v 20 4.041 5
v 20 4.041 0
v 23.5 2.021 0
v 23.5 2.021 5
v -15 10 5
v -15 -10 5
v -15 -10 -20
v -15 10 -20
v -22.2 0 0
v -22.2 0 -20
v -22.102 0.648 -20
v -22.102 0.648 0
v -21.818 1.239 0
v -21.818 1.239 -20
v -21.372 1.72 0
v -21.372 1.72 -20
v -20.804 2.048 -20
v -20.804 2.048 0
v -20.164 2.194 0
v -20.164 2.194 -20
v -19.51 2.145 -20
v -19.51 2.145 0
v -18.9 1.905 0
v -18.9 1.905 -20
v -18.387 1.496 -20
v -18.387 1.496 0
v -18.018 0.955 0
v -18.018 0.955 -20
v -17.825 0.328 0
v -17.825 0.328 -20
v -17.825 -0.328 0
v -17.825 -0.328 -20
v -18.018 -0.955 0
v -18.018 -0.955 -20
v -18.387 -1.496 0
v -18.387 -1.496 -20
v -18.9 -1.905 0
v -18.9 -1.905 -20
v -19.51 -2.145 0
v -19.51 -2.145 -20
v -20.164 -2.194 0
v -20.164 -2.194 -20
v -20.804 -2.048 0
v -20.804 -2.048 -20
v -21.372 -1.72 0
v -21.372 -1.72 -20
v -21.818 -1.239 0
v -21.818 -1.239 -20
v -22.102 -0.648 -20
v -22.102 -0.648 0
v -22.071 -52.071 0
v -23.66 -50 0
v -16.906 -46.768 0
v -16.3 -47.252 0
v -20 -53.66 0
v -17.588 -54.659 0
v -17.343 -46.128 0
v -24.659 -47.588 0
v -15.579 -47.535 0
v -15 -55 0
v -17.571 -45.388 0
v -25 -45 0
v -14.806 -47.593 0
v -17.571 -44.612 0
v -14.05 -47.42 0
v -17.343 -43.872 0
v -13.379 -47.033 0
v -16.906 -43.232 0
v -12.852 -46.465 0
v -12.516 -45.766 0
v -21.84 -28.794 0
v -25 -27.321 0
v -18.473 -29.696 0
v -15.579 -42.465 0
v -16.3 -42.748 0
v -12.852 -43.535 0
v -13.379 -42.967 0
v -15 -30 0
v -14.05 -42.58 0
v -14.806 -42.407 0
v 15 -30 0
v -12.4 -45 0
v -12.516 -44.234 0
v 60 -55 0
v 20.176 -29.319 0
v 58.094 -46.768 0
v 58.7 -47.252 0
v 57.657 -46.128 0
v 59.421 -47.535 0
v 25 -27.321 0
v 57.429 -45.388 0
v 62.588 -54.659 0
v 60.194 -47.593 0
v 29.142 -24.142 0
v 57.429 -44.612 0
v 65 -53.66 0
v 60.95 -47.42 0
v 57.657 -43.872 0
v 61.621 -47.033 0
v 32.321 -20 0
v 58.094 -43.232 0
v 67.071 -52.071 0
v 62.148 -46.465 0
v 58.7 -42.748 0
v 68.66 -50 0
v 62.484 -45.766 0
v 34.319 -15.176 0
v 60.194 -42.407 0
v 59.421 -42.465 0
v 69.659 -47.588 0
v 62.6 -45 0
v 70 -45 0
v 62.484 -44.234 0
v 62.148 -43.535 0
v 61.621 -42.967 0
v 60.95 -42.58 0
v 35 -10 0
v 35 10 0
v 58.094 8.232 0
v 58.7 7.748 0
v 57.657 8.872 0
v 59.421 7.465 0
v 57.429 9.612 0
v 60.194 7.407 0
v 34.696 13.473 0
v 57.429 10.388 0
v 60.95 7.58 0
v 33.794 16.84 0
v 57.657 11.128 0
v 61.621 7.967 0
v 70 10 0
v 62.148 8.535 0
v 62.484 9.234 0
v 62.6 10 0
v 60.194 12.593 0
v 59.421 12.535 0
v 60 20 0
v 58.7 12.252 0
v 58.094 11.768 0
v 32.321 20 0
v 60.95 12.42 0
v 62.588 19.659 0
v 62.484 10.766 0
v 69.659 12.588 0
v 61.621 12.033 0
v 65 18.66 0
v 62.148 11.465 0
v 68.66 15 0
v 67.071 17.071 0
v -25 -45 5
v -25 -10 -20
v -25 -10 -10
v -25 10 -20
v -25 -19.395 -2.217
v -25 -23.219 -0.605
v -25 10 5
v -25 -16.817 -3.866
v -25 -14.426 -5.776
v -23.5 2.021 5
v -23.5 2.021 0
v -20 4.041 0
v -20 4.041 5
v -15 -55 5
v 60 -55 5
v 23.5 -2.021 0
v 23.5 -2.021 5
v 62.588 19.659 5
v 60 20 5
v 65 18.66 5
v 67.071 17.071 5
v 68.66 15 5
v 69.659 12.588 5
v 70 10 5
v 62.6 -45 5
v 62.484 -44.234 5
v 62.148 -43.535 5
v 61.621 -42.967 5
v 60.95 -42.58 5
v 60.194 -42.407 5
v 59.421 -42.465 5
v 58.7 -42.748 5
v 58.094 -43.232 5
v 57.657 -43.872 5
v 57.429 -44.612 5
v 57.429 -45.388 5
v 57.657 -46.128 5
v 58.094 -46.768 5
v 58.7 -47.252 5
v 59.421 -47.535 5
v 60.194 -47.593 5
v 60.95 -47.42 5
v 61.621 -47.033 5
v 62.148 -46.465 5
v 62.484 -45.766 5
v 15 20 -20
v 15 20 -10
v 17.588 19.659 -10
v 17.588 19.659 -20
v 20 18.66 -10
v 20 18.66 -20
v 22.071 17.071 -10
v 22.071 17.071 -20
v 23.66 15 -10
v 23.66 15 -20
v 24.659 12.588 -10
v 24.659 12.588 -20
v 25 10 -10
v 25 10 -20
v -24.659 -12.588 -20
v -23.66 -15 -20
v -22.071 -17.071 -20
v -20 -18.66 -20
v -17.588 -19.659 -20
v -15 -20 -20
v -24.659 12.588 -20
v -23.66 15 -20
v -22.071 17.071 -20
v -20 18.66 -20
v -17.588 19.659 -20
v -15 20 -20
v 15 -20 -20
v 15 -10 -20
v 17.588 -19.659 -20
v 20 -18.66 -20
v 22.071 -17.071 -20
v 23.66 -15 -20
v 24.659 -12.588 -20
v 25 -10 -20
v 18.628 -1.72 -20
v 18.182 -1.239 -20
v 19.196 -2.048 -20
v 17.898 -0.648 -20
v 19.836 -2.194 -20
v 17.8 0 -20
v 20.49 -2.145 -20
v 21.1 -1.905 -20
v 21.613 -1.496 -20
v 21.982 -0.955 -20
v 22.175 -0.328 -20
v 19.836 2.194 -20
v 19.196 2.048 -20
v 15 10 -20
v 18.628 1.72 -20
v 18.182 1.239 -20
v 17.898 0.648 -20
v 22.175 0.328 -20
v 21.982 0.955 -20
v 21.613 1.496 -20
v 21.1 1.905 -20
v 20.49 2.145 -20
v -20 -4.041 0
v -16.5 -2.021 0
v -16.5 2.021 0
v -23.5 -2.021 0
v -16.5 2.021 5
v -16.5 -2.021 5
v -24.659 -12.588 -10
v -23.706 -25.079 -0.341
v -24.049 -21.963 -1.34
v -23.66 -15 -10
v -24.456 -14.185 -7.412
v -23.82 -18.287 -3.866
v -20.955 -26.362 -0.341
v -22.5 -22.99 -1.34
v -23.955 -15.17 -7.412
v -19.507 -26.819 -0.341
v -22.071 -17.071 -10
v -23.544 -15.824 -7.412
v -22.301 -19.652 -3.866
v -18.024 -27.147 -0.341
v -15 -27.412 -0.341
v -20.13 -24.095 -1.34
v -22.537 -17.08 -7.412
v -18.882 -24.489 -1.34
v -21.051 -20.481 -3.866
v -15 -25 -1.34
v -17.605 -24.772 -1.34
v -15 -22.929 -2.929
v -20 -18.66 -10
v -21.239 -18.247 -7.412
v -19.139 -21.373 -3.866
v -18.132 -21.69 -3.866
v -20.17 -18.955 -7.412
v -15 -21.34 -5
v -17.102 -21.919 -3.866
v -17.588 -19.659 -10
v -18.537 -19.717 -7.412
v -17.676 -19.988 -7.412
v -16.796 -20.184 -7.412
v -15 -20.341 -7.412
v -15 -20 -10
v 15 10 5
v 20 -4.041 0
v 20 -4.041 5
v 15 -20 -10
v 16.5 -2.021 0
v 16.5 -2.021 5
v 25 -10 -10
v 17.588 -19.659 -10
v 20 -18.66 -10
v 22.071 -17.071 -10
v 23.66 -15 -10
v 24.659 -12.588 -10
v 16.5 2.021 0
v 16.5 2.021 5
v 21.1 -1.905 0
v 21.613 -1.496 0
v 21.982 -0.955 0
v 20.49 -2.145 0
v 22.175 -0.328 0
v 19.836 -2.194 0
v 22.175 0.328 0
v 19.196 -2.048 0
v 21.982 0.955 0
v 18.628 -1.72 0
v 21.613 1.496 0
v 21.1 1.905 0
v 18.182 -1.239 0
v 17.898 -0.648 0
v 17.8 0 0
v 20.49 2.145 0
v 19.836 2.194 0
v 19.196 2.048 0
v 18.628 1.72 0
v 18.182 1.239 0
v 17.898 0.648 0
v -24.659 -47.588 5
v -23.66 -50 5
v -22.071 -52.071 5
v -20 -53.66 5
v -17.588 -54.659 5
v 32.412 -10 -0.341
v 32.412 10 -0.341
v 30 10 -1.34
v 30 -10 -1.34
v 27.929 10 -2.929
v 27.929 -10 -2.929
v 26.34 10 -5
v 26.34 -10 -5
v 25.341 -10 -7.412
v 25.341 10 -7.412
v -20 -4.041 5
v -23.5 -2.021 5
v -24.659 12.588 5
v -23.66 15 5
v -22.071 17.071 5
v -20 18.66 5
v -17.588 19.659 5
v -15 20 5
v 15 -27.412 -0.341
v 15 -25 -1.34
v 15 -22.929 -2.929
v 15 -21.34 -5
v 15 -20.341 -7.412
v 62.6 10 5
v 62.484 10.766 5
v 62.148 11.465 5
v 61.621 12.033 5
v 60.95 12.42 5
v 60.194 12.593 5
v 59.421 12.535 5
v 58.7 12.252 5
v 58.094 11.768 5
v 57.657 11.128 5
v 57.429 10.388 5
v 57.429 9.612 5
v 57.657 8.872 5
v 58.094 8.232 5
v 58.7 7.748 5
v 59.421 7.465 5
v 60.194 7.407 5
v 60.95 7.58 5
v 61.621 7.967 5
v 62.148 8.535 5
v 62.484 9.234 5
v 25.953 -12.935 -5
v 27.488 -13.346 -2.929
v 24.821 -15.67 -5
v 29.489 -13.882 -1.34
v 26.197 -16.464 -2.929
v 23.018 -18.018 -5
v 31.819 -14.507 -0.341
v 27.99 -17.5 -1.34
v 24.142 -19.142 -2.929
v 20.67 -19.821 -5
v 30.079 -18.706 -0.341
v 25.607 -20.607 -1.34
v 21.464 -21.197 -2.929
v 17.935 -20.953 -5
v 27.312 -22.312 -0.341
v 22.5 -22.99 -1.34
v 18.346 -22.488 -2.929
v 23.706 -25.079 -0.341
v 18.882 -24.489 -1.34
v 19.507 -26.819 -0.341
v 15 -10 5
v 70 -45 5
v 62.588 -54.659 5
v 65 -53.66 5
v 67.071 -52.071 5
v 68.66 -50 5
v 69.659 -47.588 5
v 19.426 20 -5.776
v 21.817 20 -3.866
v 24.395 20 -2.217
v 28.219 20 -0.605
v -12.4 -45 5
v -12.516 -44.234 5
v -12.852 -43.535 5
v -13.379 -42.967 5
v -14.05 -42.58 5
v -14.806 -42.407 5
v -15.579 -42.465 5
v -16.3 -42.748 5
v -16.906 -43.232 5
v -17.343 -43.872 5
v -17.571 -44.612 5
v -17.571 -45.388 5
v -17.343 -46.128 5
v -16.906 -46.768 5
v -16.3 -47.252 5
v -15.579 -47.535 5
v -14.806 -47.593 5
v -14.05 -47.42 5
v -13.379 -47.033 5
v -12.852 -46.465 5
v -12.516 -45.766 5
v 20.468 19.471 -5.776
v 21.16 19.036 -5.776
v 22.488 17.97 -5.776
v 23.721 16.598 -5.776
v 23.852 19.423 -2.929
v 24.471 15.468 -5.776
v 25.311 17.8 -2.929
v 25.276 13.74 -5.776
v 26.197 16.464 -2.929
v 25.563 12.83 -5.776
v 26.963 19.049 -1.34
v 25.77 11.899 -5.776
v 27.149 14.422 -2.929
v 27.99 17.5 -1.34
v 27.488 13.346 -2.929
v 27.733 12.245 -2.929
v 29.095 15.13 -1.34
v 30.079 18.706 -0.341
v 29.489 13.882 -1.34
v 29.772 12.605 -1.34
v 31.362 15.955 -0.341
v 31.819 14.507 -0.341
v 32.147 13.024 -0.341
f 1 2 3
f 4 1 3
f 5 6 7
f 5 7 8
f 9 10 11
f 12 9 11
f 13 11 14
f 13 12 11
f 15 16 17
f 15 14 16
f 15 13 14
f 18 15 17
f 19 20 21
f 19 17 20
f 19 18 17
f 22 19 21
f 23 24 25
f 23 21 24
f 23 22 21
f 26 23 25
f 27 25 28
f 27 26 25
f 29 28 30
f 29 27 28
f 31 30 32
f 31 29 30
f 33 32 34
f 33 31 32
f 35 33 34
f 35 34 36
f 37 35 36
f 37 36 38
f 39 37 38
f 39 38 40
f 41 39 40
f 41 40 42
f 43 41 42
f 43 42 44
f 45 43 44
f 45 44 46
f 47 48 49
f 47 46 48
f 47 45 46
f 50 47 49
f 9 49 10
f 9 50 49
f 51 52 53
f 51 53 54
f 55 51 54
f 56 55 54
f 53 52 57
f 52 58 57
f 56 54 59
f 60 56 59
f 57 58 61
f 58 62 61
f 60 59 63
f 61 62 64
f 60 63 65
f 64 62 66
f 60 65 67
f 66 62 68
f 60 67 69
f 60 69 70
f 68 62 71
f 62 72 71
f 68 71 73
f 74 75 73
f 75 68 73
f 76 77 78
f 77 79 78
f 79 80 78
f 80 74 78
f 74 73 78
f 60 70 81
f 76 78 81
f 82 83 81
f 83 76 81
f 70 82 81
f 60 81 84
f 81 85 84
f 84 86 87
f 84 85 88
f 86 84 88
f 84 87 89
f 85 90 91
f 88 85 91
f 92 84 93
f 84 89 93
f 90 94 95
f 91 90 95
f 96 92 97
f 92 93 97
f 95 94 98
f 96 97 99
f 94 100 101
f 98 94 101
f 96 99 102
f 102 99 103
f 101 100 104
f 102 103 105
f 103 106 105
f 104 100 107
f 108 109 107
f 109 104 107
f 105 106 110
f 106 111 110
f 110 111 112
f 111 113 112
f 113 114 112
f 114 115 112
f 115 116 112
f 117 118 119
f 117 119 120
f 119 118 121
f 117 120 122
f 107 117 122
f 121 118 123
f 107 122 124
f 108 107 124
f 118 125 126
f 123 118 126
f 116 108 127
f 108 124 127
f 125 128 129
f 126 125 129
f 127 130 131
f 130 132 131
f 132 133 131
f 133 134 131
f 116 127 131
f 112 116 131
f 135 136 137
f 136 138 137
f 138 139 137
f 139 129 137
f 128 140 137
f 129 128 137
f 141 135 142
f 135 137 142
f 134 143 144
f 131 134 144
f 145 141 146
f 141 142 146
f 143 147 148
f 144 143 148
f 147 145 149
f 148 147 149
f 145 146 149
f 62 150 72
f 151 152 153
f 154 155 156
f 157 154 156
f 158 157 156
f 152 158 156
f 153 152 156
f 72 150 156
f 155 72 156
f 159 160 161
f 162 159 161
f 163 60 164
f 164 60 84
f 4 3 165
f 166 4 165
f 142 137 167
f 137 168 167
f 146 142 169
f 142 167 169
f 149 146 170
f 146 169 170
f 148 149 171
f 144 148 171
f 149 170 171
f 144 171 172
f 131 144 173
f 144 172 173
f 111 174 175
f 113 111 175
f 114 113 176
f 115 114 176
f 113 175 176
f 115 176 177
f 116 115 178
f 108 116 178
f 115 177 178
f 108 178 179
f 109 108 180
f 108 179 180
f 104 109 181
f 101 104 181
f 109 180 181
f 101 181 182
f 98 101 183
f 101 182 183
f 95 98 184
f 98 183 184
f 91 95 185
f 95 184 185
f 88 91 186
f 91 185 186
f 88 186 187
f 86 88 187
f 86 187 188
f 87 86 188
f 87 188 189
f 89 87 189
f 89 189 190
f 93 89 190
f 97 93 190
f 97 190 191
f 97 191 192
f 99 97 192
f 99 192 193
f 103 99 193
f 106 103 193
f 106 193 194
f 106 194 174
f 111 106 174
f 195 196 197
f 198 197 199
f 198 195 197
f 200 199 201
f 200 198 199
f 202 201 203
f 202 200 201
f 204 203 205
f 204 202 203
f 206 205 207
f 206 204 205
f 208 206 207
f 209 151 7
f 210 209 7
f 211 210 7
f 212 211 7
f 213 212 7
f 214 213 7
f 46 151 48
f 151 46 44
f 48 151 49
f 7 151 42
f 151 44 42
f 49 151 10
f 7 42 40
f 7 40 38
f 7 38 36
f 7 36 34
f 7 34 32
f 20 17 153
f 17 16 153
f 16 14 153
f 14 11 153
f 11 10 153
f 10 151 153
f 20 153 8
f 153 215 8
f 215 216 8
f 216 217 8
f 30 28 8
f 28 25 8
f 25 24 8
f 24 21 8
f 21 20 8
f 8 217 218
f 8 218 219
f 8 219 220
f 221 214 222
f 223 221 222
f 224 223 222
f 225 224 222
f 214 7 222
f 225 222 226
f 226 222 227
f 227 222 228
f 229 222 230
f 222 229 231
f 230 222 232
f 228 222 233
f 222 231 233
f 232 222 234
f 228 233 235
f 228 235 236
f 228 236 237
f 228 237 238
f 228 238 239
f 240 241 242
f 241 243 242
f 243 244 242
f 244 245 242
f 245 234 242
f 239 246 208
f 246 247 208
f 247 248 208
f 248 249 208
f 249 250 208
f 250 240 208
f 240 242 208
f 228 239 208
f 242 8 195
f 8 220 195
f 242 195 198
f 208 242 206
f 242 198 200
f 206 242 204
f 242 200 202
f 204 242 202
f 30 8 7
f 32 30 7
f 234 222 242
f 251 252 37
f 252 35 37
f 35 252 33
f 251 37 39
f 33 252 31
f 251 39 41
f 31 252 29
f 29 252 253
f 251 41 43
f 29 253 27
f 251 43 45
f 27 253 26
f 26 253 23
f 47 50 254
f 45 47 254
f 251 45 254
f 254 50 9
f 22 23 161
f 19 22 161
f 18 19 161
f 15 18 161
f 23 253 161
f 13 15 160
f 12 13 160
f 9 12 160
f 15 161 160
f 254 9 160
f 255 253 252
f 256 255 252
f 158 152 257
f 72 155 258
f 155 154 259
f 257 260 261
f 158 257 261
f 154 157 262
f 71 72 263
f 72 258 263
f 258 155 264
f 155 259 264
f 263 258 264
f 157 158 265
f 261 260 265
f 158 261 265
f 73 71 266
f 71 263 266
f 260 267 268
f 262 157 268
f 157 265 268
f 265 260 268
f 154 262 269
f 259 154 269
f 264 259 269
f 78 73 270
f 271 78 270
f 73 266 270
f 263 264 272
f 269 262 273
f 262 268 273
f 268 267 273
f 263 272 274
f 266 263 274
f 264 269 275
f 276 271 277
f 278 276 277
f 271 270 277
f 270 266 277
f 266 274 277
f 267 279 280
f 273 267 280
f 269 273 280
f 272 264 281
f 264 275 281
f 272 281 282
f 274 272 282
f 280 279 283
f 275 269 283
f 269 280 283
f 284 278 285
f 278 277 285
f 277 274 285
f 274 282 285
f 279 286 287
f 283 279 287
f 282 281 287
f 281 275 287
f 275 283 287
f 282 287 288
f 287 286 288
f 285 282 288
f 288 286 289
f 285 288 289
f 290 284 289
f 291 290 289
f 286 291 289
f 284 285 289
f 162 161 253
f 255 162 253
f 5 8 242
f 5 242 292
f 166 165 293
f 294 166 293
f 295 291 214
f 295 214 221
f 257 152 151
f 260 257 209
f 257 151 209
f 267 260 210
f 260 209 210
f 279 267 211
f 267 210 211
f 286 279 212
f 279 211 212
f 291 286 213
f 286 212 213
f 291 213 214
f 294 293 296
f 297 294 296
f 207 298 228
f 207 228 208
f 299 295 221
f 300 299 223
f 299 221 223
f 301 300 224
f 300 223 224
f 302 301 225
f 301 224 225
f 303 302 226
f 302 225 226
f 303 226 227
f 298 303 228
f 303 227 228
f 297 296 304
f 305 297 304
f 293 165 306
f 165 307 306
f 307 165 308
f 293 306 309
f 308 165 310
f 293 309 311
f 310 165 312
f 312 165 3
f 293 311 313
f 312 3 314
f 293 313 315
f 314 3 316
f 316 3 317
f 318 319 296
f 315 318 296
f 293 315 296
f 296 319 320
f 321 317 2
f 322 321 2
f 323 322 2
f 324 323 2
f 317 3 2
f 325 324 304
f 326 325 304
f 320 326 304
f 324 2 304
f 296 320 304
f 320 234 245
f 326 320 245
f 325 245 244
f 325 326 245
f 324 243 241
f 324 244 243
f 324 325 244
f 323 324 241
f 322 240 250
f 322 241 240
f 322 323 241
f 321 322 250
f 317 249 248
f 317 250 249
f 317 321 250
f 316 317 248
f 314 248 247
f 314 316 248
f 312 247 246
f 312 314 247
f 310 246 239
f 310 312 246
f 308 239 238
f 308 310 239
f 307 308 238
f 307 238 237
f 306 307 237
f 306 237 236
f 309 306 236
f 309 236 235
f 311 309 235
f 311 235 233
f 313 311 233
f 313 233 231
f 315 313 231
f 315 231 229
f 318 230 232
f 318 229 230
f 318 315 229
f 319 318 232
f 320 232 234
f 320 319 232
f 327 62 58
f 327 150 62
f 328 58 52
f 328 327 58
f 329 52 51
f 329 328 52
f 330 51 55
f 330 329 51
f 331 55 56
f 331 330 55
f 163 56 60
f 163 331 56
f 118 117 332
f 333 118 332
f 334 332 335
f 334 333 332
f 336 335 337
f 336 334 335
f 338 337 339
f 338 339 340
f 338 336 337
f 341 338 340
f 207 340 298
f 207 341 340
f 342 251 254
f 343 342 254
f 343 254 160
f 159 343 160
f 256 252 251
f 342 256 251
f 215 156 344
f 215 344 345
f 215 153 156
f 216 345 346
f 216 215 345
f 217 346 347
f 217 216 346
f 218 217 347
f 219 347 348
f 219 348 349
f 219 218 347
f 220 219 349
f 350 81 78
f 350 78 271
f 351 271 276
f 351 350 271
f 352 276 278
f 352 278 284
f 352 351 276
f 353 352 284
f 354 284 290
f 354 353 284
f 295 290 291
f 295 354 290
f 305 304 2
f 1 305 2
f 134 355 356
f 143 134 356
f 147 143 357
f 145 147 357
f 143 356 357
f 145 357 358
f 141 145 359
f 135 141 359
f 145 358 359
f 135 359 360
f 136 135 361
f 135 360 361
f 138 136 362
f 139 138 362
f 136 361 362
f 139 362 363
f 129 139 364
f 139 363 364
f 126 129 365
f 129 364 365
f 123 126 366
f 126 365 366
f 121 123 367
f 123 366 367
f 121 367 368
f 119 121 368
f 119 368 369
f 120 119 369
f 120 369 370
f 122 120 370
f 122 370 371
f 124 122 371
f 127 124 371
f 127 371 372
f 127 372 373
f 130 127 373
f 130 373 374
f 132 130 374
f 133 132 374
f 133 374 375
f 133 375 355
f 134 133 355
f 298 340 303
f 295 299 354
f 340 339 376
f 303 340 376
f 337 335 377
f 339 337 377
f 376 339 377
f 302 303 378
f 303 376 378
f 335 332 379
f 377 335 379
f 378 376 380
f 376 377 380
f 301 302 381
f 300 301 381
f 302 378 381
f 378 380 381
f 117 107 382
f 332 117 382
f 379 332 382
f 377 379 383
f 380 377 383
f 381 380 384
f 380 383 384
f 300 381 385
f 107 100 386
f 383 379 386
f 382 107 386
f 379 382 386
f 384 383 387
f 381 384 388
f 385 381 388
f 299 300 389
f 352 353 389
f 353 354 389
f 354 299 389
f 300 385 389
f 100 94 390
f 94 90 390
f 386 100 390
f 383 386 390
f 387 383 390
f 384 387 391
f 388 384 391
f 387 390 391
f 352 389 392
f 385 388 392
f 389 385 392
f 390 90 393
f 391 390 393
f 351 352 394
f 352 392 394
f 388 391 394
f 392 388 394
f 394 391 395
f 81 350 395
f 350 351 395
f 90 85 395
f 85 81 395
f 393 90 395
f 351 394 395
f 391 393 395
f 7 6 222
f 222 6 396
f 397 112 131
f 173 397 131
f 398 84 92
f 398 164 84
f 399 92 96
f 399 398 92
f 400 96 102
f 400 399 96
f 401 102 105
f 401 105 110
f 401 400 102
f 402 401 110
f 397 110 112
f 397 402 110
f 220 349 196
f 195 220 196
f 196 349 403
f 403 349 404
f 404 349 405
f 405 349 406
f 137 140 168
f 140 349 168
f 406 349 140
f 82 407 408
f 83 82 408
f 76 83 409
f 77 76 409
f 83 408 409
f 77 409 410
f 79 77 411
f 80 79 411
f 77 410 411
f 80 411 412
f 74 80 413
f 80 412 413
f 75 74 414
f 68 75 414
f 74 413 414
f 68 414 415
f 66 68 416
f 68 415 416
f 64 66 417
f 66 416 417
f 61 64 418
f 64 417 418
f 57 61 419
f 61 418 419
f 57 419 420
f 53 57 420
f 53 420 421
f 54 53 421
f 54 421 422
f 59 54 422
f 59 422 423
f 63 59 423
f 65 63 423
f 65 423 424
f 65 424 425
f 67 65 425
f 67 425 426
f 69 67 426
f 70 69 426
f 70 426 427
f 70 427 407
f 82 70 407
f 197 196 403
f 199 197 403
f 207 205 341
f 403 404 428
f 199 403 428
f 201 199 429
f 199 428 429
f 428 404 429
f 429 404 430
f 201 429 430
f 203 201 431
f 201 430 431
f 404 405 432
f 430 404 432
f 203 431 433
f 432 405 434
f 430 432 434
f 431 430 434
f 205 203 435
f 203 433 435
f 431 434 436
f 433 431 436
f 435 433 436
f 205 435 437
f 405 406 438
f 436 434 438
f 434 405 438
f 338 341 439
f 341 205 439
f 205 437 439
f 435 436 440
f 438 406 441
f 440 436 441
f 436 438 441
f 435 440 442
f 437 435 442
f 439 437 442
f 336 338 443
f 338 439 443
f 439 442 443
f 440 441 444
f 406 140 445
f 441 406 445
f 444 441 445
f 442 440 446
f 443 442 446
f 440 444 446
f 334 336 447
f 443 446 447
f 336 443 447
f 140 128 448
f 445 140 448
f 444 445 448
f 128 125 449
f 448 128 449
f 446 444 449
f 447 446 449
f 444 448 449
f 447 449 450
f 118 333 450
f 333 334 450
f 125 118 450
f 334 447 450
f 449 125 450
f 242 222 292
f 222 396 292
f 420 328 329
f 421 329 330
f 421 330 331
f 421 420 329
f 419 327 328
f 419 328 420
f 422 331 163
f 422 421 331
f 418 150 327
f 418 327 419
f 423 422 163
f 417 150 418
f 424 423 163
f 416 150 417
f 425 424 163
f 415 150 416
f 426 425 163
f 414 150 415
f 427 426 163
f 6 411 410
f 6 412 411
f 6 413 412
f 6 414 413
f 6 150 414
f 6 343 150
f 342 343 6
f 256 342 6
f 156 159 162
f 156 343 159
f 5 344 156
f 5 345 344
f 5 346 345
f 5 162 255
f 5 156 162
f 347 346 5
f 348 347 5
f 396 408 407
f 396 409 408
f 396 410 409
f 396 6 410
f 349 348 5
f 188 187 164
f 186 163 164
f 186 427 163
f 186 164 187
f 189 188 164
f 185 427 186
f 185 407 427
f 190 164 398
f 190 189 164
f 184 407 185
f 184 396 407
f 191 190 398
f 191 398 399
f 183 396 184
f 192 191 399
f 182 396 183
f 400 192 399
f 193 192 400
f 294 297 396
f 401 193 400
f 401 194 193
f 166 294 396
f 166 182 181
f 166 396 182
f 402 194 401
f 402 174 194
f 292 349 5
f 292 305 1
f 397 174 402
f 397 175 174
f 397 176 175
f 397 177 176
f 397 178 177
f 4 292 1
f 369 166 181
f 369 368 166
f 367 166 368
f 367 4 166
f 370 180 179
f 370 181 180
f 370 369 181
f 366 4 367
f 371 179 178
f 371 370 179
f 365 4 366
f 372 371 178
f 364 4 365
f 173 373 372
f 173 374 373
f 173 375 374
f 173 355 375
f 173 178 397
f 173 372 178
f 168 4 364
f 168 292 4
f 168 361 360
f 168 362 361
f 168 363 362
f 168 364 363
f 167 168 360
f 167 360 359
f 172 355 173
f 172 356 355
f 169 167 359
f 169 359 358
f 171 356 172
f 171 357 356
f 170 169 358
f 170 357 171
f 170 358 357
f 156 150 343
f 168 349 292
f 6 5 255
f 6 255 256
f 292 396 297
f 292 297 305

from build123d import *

# Parameters (mm, degrees)
SKETCH_1_W               = 95
SKETCH_1_H               = 75
SKETCH_1_W_2             = 30
SKETCH_1_H_2             = 20
EXTRUDE_1_DEPTH          = 5
EXTRUDE_START            = -5
SKETCH_2_W               = 50
SKETCH_2_H               = 40
SKETCH_2_W_2             = 30
SKETCH_2_H_2             = 20
EXTRUDE_2_DEPTH          = 20
CUT_EXTRUDE_1_DEPTH      = 93.466210045
CUT_EXTRUDE_1_DEPTH_BACK = 93.466210045
SKETCH_3_R               = 2.2
CUT_EXTRUDE_2_DEPTH      = 5
SKETCH_5_R               = 2.6
CUT_EXTRUDE_3_DEPTH      = 93.466210045
FILLET_4_R               = 10
FILLET_5_R               = 10


with BuildPart() as part:
    # 草图1 → 凸台-拉伸1 (new body)
    with BuildSketch(Plane.XY):
        with Locations((22.5, -17.5)):
            Rectangle(SKETCH_1_W, SKETCH_1_H)
        Rectangle(SKETCH_1_W_2, SKETCH_1_H_2, mode=Mode.SUBTRACT)
    extrude(amount=EXTRUDE_1_DEPTH)

    # 草图2 → 凸台-拉伸2 (add)
    with BuildSketch(Plane.XY.offset(5).offset(EXTRUDE_START)):
        Rectangle(SKETCH_2_W, SKETCH_2_H)
        Rectangle(SKETCH_2_W_2, SKETCH_2_H_2, mode=Mode.SUBTRACT)
    extrude(amount=-EXTRUDE_2_DEPTH)

    # 草图3 → 切除-拉伸1 (cut, two sides: drawn at the far end of the back side and taken through both)
    with BuildSketch(Plane(origin=(0, 0, -20), x_dir=(-1, 0, 0), z_dir=(0, 0, -1)).offset(-CUT_EXTRUDE_1_DEPTH_BACK)):
        with Locations((20, 0)):
            Circle(SKETCH_3_R)
        with Locations((-20, 0)):
            Circle(SKETCH_3_R)
    extrude(amount=CUT_EXTRUDE_1_DEPTH + CUT_EXTRUDE_1_DEPTH_BACK, mode=Mode.SUBTRACT)

    # 草图4 → 切除-拉伸2 (cut)
    with BuildSketch(Plane(origin=(0, 0, 0), x_dir=(-1, 0, 0), z_dir=(0, 0, -1))):
        Polygon((20, 4.041451884), (16.5, 2.020725942), (16.5, -2.020725942), (20, -4.041451884), (23.5, -2.020725942), (23.5, 2.020725942), align=None)
        Polygon((-20, 4.041451884), (-23.5, 2.020725942), (-23.5, -2.020725942), (-20, -4.041451884), (-16.5, -2.020725942), (-16.5, 2.020725942), align=None)
    extrude(amount=-CUT_EXTRUDE_2_DEPTH, mode=Mode.SUBTRACT)

    # 草图5 → 切除-拉伸3 (cut, through all)
    with BuildSketch(Plane.XY.offset(5)):
        with Locations((60, -45)):
            Circle(SKETCH_5_R)
        with Locations((-15, -45)):
            Circle(SKETCH_5_R)
        with Locations((60, 10)):
            Circle(SKETCH_5_R)
    extrude(amount=-CUT_EXTRUDE_3_DEPTH, mode=Mode.SUBTRACT)

    # 圆角4
    fillet_4_edges = [part.edges().sort_by_distance(p)[0] for p in [
        (25, 20, -10),
        (25, -20, -10),
        (-25, -20, -10),
        (-25, 20, -7.5),
        (70, 20, 2.5),
        (70, -55, 2.5),
        (-25, -55, 2.5),
    ]]
    fillet(fillet_4_edges, radius=FILLET_4_R)

    # 圆角5
    # the kernel refuses this fillet: 10 mm, written as the material it adds along each edge
    with BuildSketch(Plane(origin=(15, -20, 0), x_dir=(0, 0, -1), z_dir=(-1, 0, 0))) as fillet_5_piece_1:
        with BuildLine():
            CenterArc((FILLET_5_R, FILLET_5_R), FILLET_5_R, 180, 90)
            Line((0, FILLET_5_R), (0, 0))
            Line((0, 0), (FILLET_5_R, 0))
        make_face()
    extrude(amount=30)
    with BuildSketch(Plane(origin=(25, 10, 0), x_dir=(0, 0, -1), z_dir=(0, -1, 0))) as fillet_5_piece_2:
        with BuildLine():
            CenterArc((FILLET_5_R, FILLET_5_R), FILLET_5_R, 180, 90)
            Line((0, FILLET_5_R), (0, 0))
            Line((0, 0), (FILLET_5_R, 0))
        make_face()
    extrude(amount=20)
    with BuildSketch(Plane(origin=(-15, -10, 0), x_dir=(0.801744239297648, 0.5976672776328277, 0), z_dir=(0.5976672776328277, -0.801744239297648, 0))) as fillet_5_piece_3_section:
        with BuildLine():
            CenterArc((10 + FILLET_5_R, -FILLET_5_R), FILLET_5_R, 90, 90)
            Line((10 + FILLET_5_R, 0), (10, 0))
            Line((10, 0), (10, -FILLET_5_R))
        make_face()
    fillet_5_piece_3 = revolve(axis=Axis((-15, -10, 0), (0, 0, 1)), revolution_arc=233.296989237, mode=Mode.PRIVATE)
    fillet_5_piece_3 = split(fillet_5_piece_3, bisect_by=Plane(origin=(-25, -15.925458523, -2.890503096), z_dir=(1, 0, 0)), keep=Keep.TOP, mode=Mode.PRIVATE)
    fillet_5_piece_3 = split(fillet_5_piece_3, bisect_by=Plane(origin=(-18.102265681, -5.137109304, -2.890503096), z_dir=(-0.4999999999999994, -0.866025403784439, 0)), keep=Keep.TOP, mode=Mode.PRIVATE)
    add(fillet_5_piece_3)
    with BuildSketch(Plane(origin=(15, -10, 0), x_dir=(1, 0, 0), z_dir=(0, 1, 0))) as fillet_5_piece_4:
        with BuildLine():
            CenterArc((10 + FILLET_5_R, FILLET_5_R), FILLET_5_R, 180, 90)
            Line((10 + FILLET_5_R, 0), (10, 0))
            Line((10, 0), (10, FILLET_5_R))
        make_face()
    revolve(axis=Axis((15, -10, 0), (0, 0, -1)), revolution_arc=90)
    with BuildSketch(Plane(origin=(15, 10, 0), x_dir=(-0.597667277632828, -0.8017442392976479, 0), z_dir=(0.8017442392976479, -0.597667277632828, 0))) as fillet_5_piece_5_section:
        with BuildLine():
            CenterArc((10 + FILLET_5_R, FILLET_5_R), FILLET_5_R, 180, 90)
            Line((10 + FILLET_5_R, 0), (10, 0))
            Line((10, 0), (10, FILLET_5_R))
        make_face()
    fillet_5_piece_5 = revolve(axis=Axis((15, 10, 0), (0, 0, -1)), revolution_arc=233.296989237, mode=Mode.PRIVATE)
    fillet_5_piece_5 = split(fillet_5_piece_5, bisect_by=Plane(origin=(22.499389328, 20, -3.116283122), z_dir=(0, -1, 0)), keep=Keep.TOP, mode=Mode.PRIVATE)
    fillet_5_piece_5 = split(fillet_5_piece_5, bisect_by=Plane(origin=(22.499389328, 10, -3.116283122), z_dir=(0, 1, 0)), keep=Keep.TOP, mode=Mode.PRIVATE)
    add(fillet_5_piece_5)


solid = part.part
